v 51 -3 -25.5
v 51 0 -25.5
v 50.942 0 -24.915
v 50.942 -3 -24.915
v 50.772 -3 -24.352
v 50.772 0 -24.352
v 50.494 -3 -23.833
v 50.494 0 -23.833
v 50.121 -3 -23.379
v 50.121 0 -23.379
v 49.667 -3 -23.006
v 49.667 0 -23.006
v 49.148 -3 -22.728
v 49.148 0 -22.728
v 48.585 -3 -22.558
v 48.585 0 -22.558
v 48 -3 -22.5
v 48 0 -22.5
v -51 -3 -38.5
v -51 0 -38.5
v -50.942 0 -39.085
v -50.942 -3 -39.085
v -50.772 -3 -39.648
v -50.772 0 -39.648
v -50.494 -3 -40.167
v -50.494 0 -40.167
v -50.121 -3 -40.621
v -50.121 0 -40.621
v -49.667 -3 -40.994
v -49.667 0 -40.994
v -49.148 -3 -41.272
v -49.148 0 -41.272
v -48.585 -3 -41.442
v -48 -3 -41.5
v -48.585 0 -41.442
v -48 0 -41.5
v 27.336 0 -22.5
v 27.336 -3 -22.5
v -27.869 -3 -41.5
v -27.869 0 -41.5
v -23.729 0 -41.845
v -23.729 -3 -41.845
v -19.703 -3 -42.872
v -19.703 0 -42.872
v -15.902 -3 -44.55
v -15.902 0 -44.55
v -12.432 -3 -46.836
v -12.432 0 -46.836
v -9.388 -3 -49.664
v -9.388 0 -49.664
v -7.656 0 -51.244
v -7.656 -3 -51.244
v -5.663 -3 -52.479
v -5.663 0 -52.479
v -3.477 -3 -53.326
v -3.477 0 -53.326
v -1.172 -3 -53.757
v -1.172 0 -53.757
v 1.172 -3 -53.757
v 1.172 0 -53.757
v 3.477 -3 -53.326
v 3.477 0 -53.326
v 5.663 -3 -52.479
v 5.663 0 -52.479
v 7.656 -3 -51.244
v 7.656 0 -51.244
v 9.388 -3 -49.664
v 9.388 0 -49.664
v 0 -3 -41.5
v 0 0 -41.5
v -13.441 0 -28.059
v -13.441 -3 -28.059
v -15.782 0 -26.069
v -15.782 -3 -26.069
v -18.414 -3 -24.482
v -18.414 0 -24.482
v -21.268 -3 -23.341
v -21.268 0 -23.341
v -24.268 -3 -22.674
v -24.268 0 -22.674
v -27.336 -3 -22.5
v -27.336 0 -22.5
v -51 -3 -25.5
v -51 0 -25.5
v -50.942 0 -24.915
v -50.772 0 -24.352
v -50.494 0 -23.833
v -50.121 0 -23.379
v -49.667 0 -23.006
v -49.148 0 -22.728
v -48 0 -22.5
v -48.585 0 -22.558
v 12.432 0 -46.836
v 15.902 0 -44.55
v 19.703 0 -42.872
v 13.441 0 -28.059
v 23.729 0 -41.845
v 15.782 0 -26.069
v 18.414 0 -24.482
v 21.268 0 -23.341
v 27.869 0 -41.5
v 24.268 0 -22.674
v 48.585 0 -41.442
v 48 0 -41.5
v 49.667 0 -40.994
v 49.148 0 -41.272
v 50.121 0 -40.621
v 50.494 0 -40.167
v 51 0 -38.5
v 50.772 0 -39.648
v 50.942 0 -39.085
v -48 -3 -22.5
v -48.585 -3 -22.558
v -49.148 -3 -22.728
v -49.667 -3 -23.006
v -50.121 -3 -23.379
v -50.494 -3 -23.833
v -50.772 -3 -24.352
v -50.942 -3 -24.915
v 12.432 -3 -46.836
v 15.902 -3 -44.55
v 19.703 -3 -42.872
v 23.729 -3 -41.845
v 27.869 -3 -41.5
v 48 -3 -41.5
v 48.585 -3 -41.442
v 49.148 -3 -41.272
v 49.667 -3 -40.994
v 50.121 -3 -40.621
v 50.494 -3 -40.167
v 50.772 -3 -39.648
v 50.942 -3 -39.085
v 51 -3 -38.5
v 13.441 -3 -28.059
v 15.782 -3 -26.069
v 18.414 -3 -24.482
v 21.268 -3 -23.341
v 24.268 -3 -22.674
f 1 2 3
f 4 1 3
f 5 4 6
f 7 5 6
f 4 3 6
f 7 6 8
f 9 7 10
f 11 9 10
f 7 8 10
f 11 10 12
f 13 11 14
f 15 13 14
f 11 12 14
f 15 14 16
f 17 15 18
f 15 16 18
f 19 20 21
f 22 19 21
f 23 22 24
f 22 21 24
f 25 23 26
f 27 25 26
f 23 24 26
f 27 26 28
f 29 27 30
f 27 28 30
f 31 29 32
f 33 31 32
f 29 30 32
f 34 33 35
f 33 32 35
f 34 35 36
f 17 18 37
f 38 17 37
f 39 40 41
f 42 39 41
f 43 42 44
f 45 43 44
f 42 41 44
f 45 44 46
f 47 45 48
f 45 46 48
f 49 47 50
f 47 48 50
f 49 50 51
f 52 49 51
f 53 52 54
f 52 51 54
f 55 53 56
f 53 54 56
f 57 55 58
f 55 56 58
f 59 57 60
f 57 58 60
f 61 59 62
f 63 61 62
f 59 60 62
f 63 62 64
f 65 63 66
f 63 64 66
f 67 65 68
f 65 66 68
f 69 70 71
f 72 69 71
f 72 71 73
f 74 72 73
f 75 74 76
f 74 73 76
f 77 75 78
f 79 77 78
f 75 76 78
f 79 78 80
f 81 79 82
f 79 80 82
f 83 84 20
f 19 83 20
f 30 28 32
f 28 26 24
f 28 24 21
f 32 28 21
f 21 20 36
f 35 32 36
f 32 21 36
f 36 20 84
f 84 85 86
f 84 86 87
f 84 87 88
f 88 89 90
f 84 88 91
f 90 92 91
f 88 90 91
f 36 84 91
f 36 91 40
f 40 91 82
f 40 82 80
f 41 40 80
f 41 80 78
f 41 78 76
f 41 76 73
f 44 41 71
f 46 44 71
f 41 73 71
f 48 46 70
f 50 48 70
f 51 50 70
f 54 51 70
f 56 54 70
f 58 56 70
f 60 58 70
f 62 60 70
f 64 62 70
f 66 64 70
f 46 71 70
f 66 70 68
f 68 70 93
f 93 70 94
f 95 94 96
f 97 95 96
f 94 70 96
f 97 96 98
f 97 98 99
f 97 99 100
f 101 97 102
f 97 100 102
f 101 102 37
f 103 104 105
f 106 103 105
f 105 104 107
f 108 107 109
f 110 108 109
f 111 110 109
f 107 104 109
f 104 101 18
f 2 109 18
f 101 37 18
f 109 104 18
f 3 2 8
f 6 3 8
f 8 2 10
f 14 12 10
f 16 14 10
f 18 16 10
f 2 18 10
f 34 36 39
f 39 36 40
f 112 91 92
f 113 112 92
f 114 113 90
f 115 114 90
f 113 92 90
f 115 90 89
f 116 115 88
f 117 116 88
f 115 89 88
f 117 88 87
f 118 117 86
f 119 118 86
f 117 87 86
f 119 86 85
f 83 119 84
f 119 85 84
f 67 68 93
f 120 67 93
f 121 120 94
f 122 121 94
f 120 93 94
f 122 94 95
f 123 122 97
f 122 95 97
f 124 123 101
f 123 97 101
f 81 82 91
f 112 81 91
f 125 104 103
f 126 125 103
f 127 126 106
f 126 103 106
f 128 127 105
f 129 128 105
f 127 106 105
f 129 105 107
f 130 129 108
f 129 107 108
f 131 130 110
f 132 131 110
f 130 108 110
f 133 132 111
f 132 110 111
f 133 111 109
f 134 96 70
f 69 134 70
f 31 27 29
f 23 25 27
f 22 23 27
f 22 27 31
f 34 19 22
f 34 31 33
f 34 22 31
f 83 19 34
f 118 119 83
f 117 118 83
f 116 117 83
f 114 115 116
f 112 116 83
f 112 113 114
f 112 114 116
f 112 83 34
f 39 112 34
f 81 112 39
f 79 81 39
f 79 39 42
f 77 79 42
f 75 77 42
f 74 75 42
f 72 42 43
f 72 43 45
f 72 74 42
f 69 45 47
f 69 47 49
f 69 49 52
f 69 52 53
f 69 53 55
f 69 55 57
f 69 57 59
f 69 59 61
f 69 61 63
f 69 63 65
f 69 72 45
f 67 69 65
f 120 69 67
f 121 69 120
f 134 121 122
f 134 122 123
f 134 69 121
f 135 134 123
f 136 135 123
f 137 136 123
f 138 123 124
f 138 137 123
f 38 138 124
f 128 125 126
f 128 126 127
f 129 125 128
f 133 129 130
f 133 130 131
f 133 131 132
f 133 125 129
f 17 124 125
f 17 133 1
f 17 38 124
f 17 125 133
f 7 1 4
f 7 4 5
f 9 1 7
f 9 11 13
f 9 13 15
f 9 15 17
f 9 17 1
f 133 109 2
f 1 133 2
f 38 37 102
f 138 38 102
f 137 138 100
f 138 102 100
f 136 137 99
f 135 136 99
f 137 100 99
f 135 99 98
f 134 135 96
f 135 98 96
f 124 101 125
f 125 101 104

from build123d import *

# Parameters (mm, degrees)
F1_DEPTH = 3


with BuildPart() as f1:
    # F0 (on Front) → F1 (new body)
    with BuildSketch(Plane.XZ):
        with BuildLine():
            ThreePointArc((-48, -22.5), (-50.12132, -23.37868), (-51, -25.5))
            Line((-51, -25.5), (-51, -38.5))
            ThreePointArc((-51, -38.5), (-50.12132, -40.62132), (-48, -41.5))
            Line((-48, -41.5), (-27.869387, -41.5))
            ThreePointArc((-27.869387, -41.5), (-17.767422, -43.631894), (-9.388361, -49.663977))
            ThreePointArc((-9.388361, -49.663977), (0, -53.811277), (9.388361, -49.663977))
            ThreePointArc((9.388361, -49.663977), (17.767422, -43.631894), (27.869387, -41.5))
            Line((27.869387, -41.5), (0, -41.5))
            Line((0, -41.5), (-13.44061, -28.05939))
            ThreePointArc((-13.44061, -28.05939), (-19.817915, -23.853882), (-27.336115, -22.5))
            Line((-27.336115, -22.5), (-48, -22.5))
        make_face()
        with BuildLine():
            Line((13.44061, -28.05939), (0, -41.5))
            Line((0, -41.5), (27.869387, -41.5))
            Line((27.869387, -41.5), (48, -41.5))
            ThreePointArc((48, -41.5), (50.12132, -40.62132), (51, -38.5))
            Line((51, -38.5), (51, -25.5))
            ThreePointArc((51, -25.5), (50.12132, -23.37868), (48, -22.5))
            Line((48, -22.5), (27.336115, -22.5))
            ThreePointArc((27.336115, -22.5), (19.817915, -23.853882), (13.44061, -28.05939))
        make_face()
    extrude(amount=F1_DEPTH)


solid = f1.part
